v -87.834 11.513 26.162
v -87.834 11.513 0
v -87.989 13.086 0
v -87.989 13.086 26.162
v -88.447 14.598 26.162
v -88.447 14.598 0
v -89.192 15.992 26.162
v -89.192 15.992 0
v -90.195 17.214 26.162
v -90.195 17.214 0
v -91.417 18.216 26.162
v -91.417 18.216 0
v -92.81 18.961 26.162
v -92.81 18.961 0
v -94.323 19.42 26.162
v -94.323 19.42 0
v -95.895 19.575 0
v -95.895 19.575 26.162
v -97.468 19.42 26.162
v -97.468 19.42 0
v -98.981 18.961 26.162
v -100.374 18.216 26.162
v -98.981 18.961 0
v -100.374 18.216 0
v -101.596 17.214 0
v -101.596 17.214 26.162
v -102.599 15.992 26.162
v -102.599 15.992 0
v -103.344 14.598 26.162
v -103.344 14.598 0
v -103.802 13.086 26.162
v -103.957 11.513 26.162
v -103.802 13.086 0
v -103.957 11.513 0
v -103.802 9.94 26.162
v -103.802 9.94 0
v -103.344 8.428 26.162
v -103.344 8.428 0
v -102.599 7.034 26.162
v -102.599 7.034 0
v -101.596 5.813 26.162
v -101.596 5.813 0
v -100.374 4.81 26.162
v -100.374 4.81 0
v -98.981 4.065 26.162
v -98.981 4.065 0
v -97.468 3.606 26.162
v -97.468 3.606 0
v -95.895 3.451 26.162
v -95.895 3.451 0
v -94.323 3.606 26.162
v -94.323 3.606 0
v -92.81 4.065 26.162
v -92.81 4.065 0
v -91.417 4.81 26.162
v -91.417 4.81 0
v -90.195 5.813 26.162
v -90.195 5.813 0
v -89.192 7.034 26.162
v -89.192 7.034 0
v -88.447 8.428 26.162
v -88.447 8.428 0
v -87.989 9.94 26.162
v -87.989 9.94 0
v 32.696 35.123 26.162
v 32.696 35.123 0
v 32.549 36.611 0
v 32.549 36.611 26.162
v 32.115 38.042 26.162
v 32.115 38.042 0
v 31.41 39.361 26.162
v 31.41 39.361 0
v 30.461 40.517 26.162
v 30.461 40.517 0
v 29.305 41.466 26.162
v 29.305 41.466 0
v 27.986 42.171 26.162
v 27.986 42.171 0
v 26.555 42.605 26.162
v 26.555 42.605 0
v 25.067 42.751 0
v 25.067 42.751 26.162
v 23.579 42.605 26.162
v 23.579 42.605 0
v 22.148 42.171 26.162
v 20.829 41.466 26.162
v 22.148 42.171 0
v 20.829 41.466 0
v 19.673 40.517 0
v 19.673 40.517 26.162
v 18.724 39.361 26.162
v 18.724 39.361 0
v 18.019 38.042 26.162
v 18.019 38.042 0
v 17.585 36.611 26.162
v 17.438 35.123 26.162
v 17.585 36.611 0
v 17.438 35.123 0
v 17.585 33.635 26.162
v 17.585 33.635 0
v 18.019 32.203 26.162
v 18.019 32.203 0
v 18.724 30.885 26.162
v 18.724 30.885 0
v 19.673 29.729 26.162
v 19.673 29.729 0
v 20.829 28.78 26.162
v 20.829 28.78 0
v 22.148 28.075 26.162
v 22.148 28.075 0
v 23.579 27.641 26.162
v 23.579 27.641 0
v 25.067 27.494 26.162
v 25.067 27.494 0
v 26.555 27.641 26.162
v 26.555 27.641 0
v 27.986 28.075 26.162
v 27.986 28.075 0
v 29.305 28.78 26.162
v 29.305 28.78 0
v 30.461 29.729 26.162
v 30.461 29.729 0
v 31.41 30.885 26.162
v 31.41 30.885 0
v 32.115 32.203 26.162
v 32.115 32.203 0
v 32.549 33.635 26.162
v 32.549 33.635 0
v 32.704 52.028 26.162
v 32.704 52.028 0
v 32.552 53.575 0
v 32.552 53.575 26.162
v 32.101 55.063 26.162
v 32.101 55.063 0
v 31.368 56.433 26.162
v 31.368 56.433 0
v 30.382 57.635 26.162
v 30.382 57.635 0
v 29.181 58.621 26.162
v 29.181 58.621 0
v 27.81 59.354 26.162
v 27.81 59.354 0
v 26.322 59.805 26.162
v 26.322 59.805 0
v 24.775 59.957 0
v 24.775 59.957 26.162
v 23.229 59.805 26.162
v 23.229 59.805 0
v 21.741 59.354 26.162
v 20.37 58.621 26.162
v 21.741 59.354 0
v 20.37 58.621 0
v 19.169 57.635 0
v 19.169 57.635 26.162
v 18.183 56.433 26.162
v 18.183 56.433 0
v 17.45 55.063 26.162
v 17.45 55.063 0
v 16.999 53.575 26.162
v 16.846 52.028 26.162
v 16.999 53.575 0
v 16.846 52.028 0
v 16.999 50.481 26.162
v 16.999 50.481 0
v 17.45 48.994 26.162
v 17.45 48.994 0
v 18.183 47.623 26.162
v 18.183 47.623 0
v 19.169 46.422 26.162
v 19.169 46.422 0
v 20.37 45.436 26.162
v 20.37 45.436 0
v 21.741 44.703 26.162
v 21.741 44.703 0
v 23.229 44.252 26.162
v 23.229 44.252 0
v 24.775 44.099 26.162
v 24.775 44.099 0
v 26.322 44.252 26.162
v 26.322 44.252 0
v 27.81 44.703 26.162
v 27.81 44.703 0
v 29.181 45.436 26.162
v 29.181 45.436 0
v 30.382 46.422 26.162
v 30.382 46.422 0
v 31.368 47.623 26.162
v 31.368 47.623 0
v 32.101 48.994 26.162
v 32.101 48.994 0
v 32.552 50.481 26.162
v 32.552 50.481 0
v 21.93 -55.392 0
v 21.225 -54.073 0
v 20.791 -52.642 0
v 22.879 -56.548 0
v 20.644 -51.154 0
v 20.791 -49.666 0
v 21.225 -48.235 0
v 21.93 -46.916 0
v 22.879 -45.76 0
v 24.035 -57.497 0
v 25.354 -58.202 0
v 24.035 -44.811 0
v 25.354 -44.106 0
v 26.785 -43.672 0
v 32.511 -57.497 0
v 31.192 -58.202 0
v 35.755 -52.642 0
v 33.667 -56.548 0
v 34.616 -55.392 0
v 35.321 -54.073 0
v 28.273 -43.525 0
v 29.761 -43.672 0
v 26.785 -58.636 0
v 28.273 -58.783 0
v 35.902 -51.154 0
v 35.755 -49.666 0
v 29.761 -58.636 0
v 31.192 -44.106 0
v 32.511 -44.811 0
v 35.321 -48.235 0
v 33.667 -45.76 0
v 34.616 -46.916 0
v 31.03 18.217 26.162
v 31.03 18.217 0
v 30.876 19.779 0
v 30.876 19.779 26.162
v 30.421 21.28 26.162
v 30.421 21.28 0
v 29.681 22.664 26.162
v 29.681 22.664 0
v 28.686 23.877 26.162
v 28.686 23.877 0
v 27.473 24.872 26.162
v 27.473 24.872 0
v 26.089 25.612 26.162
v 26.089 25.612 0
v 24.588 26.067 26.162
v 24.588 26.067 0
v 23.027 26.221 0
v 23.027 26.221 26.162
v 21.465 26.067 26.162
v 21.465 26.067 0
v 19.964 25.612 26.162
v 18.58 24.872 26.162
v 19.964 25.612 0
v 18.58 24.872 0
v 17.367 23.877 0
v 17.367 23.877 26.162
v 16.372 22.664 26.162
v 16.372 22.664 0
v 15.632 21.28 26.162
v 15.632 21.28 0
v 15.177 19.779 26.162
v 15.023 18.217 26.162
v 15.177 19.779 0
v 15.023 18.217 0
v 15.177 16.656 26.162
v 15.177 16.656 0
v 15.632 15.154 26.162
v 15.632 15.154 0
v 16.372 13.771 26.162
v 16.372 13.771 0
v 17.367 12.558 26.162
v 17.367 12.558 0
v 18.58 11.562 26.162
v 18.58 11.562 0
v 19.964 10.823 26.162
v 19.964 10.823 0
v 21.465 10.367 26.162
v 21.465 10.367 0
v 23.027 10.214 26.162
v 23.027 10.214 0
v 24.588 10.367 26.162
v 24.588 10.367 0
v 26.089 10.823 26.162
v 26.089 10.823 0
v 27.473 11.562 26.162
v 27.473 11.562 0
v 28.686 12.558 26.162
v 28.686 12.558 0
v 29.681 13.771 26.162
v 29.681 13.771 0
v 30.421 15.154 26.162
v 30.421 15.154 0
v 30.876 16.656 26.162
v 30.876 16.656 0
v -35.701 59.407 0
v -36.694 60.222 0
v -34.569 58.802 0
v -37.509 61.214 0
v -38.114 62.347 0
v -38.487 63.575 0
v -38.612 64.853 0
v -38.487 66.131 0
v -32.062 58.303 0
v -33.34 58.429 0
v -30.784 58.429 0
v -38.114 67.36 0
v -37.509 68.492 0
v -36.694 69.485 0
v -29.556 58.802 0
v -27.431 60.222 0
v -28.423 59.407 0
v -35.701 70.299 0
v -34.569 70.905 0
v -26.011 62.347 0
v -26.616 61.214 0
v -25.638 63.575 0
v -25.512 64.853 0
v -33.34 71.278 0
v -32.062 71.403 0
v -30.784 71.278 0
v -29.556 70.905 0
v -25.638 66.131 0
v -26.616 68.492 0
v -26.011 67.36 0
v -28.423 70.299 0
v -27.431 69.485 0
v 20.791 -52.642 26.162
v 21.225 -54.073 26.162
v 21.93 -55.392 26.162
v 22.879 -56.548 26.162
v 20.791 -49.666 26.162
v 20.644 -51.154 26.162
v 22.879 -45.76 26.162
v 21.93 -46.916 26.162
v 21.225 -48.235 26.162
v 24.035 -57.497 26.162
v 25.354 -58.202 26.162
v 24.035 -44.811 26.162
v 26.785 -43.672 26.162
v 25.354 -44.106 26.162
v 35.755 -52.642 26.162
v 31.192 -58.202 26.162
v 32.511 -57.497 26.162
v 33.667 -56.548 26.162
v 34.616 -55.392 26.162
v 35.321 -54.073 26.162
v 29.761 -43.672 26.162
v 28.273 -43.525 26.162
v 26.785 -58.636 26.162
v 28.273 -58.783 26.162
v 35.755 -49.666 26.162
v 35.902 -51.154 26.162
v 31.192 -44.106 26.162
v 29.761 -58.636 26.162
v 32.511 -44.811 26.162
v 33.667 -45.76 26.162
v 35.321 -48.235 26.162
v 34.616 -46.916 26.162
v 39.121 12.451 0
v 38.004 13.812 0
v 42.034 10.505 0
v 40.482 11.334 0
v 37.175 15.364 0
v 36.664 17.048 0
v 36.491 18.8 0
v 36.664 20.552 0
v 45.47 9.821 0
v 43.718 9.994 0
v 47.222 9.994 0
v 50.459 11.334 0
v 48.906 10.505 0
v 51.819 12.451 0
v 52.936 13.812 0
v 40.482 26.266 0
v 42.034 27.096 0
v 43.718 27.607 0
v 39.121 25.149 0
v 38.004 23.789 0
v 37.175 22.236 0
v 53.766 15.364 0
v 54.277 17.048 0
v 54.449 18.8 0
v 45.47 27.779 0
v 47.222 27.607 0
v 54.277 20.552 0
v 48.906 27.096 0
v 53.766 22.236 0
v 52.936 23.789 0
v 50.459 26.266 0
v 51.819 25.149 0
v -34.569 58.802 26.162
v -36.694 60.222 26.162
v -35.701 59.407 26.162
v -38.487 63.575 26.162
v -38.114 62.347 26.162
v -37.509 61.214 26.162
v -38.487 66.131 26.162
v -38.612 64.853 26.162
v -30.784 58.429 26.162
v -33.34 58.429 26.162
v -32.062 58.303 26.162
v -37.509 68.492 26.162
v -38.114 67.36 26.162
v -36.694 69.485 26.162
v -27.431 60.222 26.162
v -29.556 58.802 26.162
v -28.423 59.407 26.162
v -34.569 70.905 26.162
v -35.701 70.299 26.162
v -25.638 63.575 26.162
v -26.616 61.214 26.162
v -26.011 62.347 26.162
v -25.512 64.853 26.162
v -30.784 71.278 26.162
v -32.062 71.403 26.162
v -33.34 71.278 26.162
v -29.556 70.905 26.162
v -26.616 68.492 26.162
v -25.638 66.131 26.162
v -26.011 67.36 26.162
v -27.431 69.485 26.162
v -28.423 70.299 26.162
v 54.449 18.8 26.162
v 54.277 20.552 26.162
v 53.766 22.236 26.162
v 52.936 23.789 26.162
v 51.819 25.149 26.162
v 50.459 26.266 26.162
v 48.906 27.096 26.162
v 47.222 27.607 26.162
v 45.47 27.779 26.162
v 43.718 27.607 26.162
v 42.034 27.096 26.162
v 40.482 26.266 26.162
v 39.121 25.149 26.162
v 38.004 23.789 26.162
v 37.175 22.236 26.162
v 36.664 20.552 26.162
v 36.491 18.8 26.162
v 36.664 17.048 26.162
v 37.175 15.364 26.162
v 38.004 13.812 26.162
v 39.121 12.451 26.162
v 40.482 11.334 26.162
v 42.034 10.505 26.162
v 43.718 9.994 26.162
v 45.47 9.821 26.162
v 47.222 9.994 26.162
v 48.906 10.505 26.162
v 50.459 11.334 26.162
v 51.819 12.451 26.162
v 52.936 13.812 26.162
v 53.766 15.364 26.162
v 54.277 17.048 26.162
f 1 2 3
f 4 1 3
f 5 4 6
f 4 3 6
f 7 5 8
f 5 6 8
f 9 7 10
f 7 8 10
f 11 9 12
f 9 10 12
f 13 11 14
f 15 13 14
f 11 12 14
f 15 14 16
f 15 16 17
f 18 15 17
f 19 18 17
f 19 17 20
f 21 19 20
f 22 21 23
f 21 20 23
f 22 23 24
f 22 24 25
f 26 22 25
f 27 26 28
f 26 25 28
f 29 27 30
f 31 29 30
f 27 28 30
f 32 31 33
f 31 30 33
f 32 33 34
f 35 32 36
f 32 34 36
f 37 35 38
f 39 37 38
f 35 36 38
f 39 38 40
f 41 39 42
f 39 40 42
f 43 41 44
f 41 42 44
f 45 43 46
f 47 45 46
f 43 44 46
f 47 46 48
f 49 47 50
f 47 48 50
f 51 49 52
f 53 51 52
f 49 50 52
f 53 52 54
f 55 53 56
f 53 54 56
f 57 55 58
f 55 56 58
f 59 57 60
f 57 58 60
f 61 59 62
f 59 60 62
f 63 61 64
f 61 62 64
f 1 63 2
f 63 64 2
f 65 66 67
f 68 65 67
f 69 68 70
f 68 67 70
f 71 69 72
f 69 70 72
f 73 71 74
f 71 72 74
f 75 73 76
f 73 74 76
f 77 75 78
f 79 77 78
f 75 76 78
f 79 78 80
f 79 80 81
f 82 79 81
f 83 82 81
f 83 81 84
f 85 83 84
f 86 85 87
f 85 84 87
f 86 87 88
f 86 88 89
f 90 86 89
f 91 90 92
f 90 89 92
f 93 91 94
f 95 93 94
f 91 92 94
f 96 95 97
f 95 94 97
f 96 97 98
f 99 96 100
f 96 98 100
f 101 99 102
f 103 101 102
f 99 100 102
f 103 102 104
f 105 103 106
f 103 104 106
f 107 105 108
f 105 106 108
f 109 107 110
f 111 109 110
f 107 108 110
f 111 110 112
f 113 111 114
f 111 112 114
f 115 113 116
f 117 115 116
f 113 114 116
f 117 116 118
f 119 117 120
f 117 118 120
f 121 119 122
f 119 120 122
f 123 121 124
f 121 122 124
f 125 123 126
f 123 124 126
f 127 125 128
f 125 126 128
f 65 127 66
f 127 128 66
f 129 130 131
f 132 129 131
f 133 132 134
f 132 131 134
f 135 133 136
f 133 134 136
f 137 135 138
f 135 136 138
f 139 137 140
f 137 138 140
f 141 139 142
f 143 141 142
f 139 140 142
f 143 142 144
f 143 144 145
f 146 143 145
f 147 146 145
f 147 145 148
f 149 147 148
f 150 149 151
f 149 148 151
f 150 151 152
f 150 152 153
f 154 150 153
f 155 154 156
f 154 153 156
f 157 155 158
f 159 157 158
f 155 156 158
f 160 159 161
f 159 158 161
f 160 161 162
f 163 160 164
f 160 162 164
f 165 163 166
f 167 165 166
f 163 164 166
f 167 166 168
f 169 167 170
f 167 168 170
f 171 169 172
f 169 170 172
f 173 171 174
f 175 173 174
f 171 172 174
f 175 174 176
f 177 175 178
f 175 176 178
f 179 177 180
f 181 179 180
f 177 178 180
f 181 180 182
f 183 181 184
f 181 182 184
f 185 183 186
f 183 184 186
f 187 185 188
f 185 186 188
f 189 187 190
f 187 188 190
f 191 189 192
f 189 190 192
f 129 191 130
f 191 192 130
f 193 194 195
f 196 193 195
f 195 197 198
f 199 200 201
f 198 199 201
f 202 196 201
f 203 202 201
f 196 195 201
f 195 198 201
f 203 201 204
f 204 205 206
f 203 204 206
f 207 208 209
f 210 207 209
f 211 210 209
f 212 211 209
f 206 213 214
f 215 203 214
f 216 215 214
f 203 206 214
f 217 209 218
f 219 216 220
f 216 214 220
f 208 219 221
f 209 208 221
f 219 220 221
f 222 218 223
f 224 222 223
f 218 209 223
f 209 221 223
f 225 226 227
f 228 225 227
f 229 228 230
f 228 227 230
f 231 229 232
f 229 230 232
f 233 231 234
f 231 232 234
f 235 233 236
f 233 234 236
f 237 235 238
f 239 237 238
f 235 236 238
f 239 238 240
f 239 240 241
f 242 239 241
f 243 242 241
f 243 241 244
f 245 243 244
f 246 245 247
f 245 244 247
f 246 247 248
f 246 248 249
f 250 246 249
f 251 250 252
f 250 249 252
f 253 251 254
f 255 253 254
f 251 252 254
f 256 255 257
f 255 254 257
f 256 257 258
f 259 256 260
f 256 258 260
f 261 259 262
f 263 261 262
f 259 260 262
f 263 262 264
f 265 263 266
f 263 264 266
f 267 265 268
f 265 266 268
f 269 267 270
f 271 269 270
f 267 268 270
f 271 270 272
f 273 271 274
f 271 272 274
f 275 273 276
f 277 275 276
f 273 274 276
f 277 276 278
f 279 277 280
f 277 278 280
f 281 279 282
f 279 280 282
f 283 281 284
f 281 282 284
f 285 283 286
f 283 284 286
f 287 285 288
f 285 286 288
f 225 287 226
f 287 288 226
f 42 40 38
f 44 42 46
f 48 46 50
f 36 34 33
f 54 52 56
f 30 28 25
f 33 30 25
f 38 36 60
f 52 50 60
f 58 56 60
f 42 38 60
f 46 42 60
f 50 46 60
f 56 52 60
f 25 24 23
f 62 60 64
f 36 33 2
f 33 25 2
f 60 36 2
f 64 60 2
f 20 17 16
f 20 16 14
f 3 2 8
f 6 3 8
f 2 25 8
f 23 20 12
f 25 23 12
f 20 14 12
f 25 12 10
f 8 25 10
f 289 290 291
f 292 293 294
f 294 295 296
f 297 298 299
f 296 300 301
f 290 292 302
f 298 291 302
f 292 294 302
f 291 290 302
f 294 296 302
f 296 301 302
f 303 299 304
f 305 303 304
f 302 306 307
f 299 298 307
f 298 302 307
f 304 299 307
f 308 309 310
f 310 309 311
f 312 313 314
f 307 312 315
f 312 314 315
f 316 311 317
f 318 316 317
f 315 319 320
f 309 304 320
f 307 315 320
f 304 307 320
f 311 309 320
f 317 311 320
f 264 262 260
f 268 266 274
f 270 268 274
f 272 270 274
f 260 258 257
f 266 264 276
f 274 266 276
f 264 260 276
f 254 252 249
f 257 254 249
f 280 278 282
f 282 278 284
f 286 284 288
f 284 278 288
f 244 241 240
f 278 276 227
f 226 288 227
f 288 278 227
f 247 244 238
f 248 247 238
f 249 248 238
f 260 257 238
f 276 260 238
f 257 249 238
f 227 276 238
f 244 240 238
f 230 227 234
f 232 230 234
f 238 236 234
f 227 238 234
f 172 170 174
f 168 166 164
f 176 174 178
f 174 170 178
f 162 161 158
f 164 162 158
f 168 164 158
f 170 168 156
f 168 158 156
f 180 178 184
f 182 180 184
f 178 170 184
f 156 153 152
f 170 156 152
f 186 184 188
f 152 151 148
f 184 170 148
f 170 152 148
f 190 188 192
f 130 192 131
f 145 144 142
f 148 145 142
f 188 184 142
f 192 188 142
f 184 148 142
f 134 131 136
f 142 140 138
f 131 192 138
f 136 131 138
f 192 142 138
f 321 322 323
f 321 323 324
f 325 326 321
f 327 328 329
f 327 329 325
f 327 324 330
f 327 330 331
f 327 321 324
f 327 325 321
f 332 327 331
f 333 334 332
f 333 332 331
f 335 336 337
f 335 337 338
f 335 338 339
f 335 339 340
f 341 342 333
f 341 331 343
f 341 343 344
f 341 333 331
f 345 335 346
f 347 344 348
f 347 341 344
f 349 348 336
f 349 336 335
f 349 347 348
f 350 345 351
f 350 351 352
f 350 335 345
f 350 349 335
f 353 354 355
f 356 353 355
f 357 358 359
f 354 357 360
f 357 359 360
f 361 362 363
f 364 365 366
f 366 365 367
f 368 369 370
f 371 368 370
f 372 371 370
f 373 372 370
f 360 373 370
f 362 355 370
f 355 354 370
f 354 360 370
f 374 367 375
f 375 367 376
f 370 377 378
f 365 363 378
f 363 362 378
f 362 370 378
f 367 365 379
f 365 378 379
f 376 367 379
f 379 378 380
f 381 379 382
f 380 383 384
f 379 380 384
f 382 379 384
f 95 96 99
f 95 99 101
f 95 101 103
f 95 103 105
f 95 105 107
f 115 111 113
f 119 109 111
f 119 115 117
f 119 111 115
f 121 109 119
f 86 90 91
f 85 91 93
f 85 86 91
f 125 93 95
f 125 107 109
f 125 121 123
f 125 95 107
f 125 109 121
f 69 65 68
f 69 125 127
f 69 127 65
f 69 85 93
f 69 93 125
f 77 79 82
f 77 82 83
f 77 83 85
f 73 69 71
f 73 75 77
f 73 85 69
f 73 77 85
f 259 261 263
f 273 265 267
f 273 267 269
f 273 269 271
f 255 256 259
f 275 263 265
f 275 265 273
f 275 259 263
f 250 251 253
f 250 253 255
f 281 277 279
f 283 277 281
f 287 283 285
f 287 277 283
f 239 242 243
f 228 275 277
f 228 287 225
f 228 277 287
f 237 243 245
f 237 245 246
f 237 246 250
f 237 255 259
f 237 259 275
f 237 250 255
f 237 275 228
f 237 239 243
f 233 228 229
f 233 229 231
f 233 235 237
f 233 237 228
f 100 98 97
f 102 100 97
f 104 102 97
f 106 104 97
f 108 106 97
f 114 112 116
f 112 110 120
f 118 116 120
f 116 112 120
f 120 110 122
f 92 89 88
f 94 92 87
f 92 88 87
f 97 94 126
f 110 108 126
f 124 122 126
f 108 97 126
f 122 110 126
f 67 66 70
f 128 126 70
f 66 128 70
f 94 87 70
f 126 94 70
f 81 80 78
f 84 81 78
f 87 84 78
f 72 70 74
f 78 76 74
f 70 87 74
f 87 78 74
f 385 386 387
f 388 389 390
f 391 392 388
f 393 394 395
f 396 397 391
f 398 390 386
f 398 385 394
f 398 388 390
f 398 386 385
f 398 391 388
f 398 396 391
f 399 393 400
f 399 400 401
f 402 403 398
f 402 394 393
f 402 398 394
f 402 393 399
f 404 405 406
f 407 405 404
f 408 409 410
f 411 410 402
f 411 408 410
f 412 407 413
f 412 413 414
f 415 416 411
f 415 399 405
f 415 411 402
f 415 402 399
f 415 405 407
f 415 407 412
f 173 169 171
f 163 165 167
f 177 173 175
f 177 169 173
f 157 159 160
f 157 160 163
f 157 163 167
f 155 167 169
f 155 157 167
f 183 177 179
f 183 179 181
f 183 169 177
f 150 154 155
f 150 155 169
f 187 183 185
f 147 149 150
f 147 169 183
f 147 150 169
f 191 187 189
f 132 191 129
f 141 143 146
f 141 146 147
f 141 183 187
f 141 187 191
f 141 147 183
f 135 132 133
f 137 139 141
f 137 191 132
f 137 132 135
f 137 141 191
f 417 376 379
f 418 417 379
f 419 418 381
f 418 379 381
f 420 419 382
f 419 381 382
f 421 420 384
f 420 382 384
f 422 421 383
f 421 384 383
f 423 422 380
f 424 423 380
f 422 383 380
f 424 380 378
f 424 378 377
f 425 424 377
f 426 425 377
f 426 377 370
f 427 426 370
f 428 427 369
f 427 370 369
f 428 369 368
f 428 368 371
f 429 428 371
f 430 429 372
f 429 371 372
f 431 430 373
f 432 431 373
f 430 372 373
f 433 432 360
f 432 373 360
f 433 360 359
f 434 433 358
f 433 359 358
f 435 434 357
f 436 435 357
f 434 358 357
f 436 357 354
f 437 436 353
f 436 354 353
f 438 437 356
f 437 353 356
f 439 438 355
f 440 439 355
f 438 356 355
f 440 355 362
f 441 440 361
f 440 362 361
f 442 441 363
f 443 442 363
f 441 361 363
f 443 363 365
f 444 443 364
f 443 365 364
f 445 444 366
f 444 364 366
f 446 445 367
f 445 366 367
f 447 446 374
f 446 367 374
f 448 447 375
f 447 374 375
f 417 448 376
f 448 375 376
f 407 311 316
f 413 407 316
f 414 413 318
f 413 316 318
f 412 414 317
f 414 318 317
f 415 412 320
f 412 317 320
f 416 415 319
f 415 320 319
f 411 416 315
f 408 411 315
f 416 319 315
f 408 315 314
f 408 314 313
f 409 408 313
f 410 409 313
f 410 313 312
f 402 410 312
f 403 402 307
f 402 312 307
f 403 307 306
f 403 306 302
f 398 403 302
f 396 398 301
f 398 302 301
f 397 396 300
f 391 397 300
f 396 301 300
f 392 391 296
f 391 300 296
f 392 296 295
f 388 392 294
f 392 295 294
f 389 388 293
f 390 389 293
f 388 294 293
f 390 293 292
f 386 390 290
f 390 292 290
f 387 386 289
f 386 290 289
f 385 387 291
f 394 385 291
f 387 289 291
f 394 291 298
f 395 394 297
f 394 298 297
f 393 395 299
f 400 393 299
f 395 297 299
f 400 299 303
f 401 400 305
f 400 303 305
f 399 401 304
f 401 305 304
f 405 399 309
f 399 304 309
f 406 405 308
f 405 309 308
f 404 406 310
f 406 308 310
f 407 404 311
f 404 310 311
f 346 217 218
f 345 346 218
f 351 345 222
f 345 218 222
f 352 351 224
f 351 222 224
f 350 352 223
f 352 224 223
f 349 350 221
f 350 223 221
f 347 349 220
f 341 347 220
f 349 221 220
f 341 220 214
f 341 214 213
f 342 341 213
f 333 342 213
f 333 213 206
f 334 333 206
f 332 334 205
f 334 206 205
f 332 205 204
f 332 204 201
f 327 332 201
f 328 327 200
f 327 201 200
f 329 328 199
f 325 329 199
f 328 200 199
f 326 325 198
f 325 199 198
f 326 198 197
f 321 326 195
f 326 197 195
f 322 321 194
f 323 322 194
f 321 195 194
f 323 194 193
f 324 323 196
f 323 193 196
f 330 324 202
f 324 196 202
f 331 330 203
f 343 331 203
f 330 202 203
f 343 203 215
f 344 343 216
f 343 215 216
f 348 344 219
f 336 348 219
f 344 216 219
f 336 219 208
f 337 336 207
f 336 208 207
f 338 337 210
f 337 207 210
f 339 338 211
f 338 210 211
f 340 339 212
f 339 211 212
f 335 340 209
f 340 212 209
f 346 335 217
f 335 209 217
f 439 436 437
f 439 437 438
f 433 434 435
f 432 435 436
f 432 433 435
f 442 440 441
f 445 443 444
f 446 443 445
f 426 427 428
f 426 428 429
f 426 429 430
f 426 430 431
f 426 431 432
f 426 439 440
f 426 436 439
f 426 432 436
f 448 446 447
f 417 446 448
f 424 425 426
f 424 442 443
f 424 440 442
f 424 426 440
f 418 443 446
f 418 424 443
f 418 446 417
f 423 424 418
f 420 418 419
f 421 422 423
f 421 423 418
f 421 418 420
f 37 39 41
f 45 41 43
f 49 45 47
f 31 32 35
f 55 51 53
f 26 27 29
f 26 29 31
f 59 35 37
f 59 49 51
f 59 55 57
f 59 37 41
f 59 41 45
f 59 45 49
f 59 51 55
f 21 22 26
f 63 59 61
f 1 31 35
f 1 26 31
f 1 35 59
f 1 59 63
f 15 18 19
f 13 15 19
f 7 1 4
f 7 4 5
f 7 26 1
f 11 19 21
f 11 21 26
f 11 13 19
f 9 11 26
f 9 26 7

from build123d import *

# Parameters (mm, degrees)
F0_R     = 7.928984
F0_R_2   = 7.628639
F0_R_3   = 8.003643
F0_R_4   = 8.979148
F0_R_5   = 7.628641
F0_R_6   = 6.550097
F0_R_7   = 8.061809
F1_DEPTH = 26.162


with BuildPart() as f1:
    # F0 (on Top) → F1 (new body)
    with BuildSketch(Plane.XY):
        with Locations((24.775406, 52.028358)):
            Circle(F0_R)
        with Locations((25.066888, 35.122786)):
            Circle(F0_R_2)
        with Locations((23.026556, 18.217213)):
            Circle(F0_R_3)
        with Locations((45.470163, 18.800164)):
            Circle(F0_R_4)
        with Locations((28.273117, -51.153935)):
            Circle(F0_R_5)
        with Locations((-32.062296, 64.853281)):
            Circle(F0_R_6)
        with Locations((-95.89541, 11.513279)):
            Circle(F0_R_7)
    extrude(amount=F1_DEPTH)


solid = f1.part
